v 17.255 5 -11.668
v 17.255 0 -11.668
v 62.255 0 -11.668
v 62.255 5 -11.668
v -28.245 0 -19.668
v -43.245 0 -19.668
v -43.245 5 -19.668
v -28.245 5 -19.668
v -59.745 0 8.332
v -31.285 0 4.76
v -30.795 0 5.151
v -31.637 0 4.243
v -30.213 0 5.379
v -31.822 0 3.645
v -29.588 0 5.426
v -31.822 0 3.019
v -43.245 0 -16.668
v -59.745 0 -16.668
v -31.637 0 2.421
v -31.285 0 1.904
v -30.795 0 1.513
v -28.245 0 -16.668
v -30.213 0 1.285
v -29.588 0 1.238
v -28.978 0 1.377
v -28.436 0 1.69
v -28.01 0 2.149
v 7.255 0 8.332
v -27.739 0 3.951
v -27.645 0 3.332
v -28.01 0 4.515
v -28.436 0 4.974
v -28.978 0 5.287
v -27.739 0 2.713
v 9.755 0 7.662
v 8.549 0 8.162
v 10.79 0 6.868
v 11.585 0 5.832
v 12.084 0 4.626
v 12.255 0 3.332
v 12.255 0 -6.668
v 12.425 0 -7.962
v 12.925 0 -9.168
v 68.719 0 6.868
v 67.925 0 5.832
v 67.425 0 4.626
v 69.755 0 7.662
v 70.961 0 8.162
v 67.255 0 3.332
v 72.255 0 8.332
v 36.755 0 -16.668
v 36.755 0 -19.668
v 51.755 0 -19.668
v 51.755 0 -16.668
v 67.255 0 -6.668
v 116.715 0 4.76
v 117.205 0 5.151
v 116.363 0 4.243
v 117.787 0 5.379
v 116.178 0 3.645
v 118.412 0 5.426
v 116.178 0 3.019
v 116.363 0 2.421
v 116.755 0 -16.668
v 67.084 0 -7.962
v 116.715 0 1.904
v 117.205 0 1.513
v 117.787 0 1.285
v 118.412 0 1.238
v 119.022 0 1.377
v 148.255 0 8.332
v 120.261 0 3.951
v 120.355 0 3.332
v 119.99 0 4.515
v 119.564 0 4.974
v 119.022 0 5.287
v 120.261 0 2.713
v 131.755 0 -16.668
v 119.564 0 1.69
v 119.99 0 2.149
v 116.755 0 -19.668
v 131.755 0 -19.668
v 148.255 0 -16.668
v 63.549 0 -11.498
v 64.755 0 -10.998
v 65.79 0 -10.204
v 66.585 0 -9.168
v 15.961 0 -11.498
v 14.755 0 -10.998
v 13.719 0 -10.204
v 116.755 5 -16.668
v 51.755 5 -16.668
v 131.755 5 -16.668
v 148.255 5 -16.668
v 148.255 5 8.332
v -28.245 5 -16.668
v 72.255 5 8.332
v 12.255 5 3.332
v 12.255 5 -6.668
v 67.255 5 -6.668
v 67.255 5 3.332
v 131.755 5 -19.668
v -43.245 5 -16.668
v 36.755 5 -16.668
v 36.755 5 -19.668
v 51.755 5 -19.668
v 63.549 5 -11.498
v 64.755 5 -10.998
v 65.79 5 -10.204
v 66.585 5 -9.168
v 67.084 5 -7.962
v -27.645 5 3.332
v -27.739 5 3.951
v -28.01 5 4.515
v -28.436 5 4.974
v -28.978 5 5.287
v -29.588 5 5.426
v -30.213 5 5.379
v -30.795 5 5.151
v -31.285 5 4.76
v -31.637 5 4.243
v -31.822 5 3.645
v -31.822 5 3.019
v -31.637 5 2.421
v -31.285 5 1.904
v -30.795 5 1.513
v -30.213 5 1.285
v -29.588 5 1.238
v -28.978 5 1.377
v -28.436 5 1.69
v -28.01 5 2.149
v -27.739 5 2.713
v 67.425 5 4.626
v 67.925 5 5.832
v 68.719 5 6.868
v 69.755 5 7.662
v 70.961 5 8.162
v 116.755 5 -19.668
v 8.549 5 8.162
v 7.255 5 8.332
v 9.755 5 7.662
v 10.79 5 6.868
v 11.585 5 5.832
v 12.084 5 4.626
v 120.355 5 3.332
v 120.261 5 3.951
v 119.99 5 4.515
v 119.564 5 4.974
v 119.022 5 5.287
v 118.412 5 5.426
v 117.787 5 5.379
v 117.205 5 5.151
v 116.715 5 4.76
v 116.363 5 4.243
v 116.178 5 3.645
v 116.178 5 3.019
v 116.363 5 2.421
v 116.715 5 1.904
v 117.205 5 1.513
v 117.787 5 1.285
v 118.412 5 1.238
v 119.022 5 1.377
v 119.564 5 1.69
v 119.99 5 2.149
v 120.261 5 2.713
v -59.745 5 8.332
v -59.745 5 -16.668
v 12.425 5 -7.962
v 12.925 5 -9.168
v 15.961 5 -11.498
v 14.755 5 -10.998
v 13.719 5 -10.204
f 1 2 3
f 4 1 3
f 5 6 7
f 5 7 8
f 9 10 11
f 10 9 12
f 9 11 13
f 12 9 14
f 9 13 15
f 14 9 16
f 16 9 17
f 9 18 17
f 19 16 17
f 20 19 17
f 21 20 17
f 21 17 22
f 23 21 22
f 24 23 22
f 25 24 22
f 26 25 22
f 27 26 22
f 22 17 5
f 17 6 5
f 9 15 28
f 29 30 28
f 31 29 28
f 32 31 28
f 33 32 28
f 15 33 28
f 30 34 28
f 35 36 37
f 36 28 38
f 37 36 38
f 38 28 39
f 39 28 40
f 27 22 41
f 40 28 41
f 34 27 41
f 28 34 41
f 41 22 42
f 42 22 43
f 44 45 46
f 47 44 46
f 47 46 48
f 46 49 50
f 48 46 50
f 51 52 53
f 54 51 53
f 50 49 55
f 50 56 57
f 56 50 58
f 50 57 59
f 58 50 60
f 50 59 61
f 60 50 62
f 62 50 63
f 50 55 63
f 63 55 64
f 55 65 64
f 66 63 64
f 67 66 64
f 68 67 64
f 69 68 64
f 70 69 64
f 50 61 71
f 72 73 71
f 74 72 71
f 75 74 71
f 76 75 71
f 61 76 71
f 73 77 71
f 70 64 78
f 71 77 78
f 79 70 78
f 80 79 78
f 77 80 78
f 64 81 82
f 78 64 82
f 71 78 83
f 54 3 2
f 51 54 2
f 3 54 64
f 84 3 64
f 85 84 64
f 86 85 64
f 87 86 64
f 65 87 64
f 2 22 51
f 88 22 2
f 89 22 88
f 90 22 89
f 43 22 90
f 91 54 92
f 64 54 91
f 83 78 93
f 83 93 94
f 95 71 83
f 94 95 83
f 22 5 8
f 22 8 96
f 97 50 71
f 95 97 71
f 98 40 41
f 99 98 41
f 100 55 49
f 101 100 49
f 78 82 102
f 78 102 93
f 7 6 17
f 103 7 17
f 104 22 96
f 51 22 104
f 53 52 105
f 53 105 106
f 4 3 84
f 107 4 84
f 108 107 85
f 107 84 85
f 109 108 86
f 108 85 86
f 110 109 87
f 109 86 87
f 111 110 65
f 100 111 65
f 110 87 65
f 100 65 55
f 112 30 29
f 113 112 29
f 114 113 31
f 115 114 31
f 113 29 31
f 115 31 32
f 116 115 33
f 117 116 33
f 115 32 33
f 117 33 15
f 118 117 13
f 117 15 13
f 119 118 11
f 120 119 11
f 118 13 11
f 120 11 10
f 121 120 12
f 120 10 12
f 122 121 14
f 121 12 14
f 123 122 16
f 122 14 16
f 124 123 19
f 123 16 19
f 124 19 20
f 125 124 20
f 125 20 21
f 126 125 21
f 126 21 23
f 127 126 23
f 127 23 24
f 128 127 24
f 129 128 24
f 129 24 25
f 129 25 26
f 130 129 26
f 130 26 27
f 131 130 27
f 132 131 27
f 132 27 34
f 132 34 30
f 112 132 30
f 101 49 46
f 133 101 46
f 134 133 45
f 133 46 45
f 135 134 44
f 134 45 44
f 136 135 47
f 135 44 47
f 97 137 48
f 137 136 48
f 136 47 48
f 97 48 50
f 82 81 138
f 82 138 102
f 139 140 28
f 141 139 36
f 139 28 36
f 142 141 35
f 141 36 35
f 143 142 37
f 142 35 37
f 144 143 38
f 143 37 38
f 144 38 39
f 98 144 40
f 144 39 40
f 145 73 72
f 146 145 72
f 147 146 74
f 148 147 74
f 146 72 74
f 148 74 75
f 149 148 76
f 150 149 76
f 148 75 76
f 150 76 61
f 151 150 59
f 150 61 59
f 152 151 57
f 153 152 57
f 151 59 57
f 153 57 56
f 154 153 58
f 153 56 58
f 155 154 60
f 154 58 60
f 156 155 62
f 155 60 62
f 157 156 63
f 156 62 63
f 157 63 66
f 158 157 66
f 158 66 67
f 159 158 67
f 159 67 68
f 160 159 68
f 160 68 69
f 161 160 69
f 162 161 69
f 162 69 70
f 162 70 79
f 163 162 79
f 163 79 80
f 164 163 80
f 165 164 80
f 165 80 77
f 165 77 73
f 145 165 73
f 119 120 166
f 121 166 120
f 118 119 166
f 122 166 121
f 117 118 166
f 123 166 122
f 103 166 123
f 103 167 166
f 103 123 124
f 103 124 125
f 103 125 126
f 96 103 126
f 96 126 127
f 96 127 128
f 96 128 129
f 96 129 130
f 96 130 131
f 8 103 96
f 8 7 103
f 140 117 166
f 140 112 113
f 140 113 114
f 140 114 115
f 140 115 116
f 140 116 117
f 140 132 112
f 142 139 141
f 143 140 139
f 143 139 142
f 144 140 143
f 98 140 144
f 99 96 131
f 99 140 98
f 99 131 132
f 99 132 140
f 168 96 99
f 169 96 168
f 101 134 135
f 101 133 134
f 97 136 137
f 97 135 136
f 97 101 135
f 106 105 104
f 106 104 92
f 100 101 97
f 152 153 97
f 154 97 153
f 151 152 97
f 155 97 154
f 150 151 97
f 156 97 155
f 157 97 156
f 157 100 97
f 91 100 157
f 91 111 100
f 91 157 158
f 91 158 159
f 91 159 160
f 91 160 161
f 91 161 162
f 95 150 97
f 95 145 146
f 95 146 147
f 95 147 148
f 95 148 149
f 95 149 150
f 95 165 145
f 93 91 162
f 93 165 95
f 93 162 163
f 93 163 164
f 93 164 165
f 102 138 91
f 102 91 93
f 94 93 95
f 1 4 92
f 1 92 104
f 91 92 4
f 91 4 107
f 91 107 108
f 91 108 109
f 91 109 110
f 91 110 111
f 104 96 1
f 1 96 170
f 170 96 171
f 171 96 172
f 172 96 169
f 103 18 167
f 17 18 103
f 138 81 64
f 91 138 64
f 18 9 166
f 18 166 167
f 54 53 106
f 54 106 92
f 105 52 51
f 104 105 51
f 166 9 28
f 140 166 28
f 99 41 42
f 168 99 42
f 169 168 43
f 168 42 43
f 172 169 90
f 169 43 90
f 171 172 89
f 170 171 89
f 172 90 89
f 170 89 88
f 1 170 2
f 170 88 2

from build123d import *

# Parameters (mm, degrees)
SKETCH1_W            = 208
SKETCH1_H            = 25
BOSS_EXTRUDE1_DEPTH  = 5
SURUCU_BOSLUGU_DEPTH = 6
SKETCH7_R            = 2.1
KASA_BAGLANTI_DEPTH  = 6
SKETCH8_W            = 15
SKETCH8_H            = 3
YAN_BAGLANTI_DEPTH   = 5


with BuildPart() as part:
    # Sketch1 → Boss-Extrude1 (new body)
    with BuildSketch(Plane(origin=(0, 0, 0), x_dir=(1, 0, 0), z_dir=(0, 1, 0))):
        with Locations((44.254700849, 4.167980547)):
            Rectangle(SKETCH1_W, SKETCH1_H)
    extrude(amount=BOSS_EXTRUDE1_DEPTH)

    # Sketch6 → Surucu Boslugu (cut, through all)
    with BuildSketch(Plane(origin=(0, 0, 0), x_dir=(-1, 0, 0), z_dir=(0, -1, 0))):
        with BuildLine():
            Line((-72.254700849, -8.332019453), (-7.254700849, -8.332019453))
            ThreePointArc((-7.254700849, -8.332019453), (-10.790234755, -6.867553359), (-12.254700849, -3.332019453))
            Line((-12.254700849, -3.332019453), (-12.254700849, 6.667980547))
            ThreePointArc((-12.254700849, 6.667980547), (-13.719166943, 10.203514453), (-17.254700849, 11.667980547))
            Line((-17.254700849, 11.667980547), (-62.254700849, 11.667980547))
            ThreePointArc((-62.254700849, 11.667980547), (-65.790234755, 10.203514453), (-67.254700849, 6.667980547))
            Line((-67.254700849, 6.667980547), (-67.254700849, -3.332019453))
            ThreePointArc((-67.254700849, -3.332019453), (-68.719166943, -6.867553359), (-72.254700849, -8.332019453))
        make_face()
    extrude(amount=-SURUCU_BOSLUGU_DEPTH, mode=Mode.SUBTRACT)

    # Sketch7 → Kasa Baglanti (cut, through all)
    with BuildSketch(Plane.XZ):
        with Locations((-29.745299151, 3.332019453)):
            Circle(SKETCH7_R)
        with Locations((118.254700849, 3.332019453)):
            Circle(SKETCH7_R)
    extrude(amount=-KASA_BAGLANTI_DEPTH, mode=Mode.SUBTRACT)

    # Sketch8 → Yan Baglanti (add, through all)
    with BuildSketch(Plane.XZ):
        with Locations((124.254700849, -18.167980547)):
            Rectangle(SKETCH8_W, SKETCH8_H)
        with Locations((44.254700849, -18.167980547)):
            Rectangle(SKETCH8_W, SKETCH8_H)
        with Locations((-35.745299151, -18.167980547)):
            Rectangle(SKETCH8_W, SKETCH8_H)
    extrude(amount=-YAN_BAGLANTI_DEPTH)


solid = part.part
